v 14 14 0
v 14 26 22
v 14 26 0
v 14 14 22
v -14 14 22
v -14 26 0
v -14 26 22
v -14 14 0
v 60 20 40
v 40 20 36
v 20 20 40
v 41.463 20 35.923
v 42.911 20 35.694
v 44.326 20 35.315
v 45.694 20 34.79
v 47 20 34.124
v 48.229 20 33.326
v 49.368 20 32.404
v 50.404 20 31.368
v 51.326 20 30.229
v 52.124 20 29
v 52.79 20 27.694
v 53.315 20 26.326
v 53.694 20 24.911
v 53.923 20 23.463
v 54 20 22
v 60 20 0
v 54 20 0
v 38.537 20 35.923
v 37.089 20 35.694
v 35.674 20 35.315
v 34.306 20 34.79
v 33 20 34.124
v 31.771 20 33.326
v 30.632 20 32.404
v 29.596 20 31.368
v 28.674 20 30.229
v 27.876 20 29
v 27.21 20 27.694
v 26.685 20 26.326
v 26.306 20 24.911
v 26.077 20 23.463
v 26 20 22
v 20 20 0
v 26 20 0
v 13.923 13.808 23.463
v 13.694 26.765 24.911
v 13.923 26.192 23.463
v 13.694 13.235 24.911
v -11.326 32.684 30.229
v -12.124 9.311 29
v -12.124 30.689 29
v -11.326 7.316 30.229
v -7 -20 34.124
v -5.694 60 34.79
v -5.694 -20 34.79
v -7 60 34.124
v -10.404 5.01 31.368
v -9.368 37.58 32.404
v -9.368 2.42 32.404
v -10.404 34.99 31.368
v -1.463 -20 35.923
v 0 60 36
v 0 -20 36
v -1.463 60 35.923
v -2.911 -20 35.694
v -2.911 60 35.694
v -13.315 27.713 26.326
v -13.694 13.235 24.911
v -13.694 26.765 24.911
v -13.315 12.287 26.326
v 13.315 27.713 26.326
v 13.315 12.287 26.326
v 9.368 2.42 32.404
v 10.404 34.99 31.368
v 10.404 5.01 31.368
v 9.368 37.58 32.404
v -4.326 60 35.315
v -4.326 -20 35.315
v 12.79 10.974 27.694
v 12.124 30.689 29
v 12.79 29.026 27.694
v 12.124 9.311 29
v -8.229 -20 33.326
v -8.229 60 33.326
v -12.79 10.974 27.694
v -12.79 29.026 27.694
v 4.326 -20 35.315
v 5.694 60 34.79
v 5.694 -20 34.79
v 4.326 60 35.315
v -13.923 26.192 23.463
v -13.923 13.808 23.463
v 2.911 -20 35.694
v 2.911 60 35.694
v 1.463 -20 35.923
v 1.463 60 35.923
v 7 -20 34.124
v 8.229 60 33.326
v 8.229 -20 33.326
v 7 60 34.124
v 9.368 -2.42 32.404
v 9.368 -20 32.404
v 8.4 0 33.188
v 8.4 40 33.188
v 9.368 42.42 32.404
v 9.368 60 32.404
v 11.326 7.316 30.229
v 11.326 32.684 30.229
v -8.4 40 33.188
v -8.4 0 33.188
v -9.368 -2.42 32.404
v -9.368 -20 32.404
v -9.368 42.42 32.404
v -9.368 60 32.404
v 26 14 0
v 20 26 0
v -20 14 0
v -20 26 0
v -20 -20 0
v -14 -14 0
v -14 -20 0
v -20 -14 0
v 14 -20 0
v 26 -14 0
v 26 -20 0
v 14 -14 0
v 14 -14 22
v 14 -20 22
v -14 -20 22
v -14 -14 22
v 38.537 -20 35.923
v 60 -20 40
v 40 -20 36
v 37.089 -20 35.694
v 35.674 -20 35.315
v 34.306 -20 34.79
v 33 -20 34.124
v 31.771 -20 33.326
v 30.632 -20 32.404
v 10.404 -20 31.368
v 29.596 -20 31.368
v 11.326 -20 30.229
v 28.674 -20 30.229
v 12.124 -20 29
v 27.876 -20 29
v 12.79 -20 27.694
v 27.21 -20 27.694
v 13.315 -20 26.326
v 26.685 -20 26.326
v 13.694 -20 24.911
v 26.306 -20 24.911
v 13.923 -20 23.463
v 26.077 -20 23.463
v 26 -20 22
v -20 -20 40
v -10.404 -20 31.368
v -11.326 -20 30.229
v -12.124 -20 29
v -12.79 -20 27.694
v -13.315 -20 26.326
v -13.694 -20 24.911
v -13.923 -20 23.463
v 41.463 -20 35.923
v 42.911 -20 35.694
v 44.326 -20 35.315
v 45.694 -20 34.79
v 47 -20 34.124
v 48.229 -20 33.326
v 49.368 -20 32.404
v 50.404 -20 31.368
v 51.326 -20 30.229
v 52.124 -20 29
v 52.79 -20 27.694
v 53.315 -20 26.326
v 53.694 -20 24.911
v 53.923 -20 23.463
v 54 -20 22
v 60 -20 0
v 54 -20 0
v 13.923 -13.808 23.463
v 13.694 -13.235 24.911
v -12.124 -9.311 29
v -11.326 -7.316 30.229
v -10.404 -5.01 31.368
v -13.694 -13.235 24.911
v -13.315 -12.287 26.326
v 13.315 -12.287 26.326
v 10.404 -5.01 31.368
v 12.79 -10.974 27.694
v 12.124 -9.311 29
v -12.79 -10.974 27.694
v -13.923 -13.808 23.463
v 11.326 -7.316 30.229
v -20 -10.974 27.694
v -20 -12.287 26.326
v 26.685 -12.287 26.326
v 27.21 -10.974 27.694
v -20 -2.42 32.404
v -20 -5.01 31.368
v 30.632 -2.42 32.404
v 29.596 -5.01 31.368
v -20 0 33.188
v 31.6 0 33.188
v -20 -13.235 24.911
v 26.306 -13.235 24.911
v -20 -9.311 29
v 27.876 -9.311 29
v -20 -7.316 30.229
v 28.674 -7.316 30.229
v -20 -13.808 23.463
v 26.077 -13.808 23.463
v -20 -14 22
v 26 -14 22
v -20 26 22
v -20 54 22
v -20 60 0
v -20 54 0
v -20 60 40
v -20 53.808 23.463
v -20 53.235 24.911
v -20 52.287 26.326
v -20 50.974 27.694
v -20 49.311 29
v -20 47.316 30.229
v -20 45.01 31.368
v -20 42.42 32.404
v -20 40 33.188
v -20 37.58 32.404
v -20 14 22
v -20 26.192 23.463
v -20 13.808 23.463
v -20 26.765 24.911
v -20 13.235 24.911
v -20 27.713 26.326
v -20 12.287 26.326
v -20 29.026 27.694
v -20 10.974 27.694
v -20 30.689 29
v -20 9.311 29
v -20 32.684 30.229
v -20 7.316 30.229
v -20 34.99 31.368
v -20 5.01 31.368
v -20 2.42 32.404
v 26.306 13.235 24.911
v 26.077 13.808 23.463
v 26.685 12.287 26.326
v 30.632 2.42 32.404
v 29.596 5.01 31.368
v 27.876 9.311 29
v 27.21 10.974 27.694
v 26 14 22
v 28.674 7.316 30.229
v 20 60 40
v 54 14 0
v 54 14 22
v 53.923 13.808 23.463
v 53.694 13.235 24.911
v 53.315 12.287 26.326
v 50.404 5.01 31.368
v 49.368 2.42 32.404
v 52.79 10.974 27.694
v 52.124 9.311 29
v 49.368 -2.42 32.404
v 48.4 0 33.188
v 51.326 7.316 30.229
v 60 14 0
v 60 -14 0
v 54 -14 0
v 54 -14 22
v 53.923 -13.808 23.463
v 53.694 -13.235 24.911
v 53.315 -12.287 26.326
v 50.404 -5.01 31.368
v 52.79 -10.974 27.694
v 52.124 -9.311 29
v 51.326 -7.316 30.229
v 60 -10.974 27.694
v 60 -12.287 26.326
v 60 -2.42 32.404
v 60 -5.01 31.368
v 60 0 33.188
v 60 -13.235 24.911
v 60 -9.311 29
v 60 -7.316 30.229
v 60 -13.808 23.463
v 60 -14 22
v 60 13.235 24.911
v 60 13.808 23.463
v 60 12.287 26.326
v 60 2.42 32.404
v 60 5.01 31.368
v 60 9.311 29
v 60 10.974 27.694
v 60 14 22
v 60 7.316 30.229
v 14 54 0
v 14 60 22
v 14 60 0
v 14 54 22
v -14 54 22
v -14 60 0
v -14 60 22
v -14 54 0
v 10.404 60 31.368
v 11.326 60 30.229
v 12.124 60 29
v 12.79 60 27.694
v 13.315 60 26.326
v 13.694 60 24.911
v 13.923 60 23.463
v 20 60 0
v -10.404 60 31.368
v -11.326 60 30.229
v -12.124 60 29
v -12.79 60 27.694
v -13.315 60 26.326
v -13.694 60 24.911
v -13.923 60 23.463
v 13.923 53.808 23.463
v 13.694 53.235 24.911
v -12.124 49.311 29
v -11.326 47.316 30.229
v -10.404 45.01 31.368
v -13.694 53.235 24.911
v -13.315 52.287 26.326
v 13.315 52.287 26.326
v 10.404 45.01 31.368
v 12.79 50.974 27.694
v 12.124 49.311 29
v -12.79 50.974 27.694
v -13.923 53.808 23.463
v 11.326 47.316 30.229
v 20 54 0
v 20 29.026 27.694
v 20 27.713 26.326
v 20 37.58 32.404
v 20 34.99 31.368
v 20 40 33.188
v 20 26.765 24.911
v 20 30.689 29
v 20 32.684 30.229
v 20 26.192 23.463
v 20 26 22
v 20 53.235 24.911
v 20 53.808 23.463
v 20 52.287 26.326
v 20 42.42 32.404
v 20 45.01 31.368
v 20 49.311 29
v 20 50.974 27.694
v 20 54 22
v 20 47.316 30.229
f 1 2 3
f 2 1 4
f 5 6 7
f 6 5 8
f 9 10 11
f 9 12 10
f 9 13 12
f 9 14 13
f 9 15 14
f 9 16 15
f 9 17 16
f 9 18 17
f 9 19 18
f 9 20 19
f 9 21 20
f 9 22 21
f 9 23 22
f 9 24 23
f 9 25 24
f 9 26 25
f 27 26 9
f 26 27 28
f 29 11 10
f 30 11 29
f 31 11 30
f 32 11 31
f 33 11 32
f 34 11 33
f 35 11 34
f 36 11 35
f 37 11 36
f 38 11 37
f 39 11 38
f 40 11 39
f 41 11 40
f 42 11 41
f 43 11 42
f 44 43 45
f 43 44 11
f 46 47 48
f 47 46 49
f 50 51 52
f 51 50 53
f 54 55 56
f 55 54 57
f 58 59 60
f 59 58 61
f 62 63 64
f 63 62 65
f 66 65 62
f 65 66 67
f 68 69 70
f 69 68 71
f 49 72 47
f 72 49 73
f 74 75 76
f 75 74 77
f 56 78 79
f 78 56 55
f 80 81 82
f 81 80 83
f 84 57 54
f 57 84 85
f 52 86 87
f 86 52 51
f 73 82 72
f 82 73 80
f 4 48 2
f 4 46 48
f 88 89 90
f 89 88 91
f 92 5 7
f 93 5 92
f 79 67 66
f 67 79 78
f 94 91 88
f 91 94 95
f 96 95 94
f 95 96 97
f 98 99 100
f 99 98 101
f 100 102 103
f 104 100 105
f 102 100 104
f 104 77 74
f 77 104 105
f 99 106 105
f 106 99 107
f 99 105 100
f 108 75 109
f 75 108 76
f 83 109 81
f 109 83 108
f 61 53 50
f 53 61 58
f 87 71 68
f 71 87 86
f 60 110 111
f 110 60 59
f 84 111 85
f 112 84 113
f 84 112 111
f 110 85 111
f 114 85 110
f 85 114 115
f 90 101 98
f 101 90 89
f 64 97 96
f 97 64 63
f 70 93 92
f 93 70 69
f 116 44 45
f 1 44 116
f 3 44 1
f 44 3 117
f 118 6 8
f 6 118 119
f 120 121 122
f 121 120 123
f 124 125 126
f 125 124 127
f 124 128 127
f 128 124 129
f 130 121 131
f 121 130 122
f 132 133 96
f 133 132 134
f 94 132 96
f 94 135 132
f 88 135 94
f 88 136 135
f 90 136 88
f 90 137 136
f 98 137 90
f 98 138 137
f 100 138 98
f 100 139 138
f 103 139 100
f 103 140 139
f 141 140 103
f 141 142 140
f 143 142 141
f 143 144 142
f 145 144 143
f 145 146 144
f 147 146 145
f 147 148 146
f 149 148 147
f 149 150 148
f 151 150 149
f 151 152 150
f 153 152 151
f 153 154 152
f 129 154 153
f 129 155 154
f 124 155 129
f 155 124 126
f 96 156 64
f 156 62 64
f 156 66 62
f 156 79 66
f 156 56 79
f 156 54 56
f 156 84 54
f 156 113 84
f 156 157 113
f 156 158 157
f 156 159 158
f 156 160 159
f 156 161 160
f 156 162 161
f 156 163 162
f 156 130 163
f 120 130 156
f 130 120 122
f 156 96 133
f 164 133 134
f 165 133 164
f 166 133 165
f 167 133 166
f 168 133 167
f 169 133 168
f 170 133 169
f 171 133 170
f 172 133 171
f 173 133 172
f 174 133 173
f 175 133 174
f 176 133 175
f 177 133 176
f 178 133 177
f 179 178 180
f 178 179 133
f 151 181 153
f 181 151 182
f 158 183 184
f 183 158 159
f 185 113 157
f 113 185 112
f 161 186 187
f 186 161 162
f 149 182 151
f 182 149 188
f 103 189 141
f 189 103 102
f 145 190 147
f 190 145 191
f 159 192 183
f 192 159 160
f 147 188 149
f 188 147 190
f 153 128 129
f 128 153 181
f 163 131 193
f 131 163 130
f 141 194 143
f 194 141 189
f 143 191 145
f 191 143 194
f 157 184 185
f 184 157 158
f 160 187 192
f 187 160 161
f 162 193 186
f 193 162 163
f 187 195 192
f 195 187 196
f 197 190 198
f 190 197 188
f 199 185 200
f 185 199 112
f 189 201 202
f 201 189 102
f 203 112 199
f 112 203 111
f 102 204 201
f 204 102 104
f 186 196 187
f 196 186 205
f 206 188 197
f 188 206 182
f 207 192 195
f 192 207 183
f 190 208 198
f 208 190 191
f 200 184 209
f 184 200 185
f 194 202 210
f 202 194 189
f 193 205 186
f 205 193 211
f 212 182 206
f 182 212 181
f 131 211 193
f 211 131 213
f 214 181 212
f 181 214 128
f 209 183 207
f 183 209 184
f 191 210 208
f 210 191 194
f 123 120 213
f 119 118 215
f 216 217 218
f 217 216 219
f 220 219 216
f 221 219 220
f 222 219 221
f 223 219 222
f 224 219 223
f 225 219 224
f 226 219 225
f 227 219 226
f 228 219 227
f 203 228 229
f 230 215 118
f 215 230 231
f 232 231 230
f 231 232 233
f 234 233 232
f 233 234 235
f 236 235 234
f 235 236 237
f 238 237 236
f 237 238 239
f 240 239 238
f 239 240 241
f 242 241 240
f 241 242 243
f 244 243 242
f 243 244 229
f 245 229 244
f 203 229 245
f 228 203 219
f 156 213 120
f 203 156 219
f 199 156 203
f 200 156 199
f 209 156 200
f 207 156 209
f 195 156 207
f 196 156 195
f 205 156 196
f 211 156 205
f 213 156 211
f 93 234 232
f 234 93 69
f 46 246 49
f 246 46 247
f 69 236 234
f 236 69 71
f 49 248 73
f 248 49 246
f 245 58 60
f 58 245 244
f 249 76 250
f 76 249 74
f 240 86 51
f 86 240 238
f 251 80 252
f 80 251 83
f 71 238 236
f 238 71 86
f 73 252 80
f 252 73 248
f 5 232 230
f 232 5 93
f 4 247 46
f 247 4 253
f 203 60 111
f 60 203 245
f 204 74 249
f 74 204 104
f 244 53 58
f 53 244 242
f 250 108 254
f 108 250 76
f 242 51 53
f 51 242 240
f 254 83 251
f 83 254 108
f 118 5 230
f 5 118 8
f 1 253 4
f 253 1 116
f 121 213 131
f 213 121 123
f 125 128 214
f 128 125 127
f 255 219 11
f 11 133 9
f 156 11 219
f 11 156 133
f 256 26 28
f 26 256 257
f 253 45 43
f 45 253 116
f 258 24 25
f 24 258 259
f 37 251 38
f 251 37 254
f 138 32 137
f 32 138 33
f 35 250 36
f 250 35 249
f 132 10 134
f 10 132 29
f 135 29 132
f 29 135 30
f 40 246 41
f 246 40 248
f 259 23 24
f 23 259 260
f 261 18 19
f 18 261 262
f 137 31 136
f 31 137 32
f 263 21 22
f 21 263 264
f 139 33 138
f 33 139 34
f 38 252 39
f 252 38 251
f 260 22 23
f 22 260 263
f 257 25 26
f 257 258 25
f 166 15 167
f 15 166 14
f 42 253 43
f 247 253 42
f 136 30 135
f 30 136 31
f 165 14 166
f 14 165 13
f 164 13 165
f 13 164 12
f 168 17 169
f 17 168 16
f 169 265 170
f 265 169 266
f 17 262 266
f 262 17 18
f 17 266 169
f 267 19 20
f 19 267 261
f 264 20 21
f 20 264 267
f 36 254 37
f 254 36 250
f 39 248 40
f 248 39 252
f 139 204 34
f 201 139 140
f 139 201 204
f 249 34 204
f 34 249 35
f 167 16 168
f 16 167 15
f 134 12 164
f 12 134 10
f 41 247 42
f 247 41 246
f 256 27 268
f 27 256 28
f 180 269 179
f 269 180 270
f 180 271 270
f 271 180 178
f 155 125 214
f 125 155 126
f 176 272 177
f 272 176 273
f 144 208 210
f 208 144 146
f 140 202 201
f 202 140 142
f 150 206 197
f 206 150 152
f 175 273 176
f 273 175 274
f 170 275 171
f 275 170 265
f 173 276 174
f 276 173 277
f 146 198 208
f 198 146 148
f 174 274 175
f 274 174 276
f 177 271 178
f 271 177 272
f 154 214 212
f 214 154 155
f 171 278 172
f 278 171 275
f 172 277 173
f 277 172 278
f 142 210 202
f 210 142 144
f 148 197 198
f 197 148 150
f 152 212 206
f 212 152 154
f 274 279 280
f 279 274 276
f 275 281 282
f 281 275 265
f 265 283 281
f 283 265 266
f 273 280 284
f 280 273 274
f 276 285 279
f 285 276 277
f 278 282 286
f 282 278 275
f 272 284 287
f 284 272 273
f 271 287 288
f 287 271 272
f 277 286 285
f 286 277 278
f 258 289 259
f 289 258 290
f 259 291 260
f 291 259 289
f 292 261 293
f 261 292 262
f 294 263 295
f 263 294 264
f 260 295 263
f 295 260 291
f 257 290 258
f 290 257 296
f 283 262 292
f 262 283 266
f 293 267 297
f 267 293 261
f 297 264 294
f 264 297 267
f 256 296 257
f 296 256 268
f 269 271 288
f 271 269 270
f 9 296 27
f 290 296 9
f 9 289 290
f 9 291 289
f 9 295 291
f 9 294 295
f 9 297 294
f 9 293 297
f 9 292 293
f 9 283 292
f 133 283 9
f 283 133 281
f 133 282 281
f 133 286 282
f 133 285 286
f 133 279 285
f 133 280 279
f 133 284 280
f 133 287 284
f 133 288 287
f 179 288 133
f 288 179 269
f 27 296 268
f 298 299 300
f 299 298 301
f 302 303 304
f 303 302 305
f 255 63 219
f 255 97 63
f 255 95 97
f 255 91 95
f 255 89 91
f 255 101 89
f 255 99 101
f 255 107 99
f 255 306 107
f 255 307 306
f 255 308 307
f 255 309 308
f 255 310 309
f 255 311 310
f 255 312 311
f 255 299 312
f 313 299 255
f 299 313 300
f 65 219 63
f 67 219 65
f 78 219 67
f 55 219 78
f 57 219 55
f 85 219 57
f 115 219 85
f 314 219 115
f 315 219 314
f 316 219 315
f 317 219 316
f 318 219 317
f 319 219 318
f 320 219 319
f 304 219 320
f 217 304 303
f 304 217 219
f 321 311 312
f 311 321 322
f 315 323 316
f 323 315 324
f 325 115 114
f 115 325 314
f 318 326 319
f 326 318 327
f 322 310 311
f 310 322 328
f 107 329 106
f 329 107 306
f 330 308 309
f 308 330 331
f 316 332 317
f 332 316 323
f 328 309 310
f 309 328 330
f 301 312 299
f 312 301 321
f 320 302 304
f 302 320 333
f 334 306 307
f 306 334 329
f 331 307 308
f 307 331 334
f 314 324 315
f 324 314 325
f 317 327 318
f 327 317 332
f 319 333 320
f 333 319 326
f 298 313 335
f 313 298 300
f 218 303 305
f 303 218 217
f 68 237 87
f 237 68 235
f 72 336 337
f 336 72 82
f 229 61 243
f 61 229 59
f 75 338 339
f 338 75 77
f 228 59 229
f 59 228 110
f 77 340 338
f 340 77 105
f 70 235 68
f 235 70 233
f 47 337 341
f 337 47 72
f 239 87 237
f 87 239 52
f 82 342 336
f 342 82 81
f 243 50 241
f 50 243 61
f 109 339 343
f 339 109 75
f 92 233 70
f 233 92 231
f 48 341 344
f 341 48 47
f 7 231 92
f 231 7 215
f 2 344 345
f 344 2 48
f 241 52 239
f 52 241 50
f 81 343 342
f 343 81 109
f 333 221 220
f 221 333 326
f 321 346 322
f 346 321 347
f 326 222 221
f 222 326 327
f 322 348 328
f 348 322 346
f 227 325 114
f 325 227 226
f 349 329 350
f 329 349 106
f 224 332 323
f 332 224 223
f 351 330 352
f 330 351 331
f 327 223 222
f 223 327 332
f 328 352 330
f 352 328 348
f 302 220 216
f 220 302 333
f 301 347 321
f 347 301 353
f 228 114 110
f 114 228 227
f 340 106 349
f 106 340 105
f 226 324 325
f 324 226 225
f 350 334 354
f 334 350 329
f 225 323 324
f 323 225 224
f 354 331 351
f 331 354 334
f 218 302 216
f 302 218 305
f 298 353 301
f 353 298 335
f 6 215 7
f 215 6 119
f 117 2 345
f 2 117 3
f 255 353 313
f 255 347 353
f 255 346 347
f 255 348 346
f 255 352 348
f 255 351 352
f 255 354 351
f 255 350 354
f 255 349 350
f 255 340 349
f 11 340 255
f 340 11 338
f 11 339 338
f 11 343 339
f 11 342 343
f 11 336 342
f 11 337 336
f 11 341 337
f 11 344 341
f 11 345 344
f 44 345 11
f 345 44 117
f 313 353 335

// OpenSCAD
$fn=60;


cube_portal([40,40,40]);
translate([40,0,0]){
    cube_portal([40,40,40]);
}
translate([0,40,0]){
    cube_portal([40,40,40]);
}
//doorV([40,40,40]);

module doorV(size) {
     translate([0,0,size[2]/2]) {
        difference() {
            cube(size,true);
            difference() {
                translate([0,0,size[2]/2-size[0]/4]) {
                    cube([size[0],size[1],size[0]/2],true);
                }
                
                scale([0.75/0.3,1,1]){
                intersection(){
                translate([size[0]*0.3,0,size[2]/2-size[0]/2]) {
                    rotate([90,90,0]) {
                        cylinder(h=size[1], r1=size[0]/2, r2=size[0]/2, center=true);
                    }
                }
              
                translate([-size[0]*0.3,0,size[2]/2-size[0]/2]) {
                    rotate([90,90,0]) {
                        cylinder(h=size[1], r1=size[0]/2, r2=size[0]/2, center=true);
                    }
                }
                }
                }
                
            }
        }  
    }
}

module doorU(size) {
    translate([0,0,size[2]/2]) {
        difference() {
            cube(size,true);
            difference() {
                translate([0,0,size[2]/2-size[0]/4]) {
                    cube([size[0],size[1],size[0]/2],true);
                }
                translate([0,0,size[2]/2-size[0]/2]) {
                    rotate([90,90,0]) {
                        cylinder(h=size[1], r1=size[0]/2, r2=size[0]/2, center=true);
                    }
                }  
            }
        }  
    }
}



module cube_portal(size=[60,60,100], portal=[0.7,.5,0.9]) {
    
    difference() {
                
        translate([0,0,size[2]/2]) { 
            cube(size,true);
        }
            
        union(){
            
            translate([0,(size[1]/2-size[1]*portal[1]/2),0]) { 
                doorU([
                    size[0]*portal[0],
                    size[1]*portal[1],
                    size[2]*portal[2],
                ]);
            }
            
            translate([0,-(size[1]/2-size[1]*portal[1]/2),0]) { 
                doorU([
                    size[0]*portal[0],
                    size[1]*portal[1],
                    size[2]*portal[2],
                ]);
            }
            
            rotate([0,0,90]) {
                translate([0,(size[1]/2-size[1]*portal[1]/2),0]) { 
                    doorV([
                        size[0]*portal[0],
                        size[1]*portal[1],
                        size[2]*portal[2],
                    ]);
                }
                
                translate([0,-(size[1]/2-size[1]*portal[1]/2),0]) { 
                    doorV([
                        size[0]*portal[0],
                        size[1]*portal[1],
                        size[2]*portal[2],
                    ]);
                }
            }
        
        }
    
    }
}
